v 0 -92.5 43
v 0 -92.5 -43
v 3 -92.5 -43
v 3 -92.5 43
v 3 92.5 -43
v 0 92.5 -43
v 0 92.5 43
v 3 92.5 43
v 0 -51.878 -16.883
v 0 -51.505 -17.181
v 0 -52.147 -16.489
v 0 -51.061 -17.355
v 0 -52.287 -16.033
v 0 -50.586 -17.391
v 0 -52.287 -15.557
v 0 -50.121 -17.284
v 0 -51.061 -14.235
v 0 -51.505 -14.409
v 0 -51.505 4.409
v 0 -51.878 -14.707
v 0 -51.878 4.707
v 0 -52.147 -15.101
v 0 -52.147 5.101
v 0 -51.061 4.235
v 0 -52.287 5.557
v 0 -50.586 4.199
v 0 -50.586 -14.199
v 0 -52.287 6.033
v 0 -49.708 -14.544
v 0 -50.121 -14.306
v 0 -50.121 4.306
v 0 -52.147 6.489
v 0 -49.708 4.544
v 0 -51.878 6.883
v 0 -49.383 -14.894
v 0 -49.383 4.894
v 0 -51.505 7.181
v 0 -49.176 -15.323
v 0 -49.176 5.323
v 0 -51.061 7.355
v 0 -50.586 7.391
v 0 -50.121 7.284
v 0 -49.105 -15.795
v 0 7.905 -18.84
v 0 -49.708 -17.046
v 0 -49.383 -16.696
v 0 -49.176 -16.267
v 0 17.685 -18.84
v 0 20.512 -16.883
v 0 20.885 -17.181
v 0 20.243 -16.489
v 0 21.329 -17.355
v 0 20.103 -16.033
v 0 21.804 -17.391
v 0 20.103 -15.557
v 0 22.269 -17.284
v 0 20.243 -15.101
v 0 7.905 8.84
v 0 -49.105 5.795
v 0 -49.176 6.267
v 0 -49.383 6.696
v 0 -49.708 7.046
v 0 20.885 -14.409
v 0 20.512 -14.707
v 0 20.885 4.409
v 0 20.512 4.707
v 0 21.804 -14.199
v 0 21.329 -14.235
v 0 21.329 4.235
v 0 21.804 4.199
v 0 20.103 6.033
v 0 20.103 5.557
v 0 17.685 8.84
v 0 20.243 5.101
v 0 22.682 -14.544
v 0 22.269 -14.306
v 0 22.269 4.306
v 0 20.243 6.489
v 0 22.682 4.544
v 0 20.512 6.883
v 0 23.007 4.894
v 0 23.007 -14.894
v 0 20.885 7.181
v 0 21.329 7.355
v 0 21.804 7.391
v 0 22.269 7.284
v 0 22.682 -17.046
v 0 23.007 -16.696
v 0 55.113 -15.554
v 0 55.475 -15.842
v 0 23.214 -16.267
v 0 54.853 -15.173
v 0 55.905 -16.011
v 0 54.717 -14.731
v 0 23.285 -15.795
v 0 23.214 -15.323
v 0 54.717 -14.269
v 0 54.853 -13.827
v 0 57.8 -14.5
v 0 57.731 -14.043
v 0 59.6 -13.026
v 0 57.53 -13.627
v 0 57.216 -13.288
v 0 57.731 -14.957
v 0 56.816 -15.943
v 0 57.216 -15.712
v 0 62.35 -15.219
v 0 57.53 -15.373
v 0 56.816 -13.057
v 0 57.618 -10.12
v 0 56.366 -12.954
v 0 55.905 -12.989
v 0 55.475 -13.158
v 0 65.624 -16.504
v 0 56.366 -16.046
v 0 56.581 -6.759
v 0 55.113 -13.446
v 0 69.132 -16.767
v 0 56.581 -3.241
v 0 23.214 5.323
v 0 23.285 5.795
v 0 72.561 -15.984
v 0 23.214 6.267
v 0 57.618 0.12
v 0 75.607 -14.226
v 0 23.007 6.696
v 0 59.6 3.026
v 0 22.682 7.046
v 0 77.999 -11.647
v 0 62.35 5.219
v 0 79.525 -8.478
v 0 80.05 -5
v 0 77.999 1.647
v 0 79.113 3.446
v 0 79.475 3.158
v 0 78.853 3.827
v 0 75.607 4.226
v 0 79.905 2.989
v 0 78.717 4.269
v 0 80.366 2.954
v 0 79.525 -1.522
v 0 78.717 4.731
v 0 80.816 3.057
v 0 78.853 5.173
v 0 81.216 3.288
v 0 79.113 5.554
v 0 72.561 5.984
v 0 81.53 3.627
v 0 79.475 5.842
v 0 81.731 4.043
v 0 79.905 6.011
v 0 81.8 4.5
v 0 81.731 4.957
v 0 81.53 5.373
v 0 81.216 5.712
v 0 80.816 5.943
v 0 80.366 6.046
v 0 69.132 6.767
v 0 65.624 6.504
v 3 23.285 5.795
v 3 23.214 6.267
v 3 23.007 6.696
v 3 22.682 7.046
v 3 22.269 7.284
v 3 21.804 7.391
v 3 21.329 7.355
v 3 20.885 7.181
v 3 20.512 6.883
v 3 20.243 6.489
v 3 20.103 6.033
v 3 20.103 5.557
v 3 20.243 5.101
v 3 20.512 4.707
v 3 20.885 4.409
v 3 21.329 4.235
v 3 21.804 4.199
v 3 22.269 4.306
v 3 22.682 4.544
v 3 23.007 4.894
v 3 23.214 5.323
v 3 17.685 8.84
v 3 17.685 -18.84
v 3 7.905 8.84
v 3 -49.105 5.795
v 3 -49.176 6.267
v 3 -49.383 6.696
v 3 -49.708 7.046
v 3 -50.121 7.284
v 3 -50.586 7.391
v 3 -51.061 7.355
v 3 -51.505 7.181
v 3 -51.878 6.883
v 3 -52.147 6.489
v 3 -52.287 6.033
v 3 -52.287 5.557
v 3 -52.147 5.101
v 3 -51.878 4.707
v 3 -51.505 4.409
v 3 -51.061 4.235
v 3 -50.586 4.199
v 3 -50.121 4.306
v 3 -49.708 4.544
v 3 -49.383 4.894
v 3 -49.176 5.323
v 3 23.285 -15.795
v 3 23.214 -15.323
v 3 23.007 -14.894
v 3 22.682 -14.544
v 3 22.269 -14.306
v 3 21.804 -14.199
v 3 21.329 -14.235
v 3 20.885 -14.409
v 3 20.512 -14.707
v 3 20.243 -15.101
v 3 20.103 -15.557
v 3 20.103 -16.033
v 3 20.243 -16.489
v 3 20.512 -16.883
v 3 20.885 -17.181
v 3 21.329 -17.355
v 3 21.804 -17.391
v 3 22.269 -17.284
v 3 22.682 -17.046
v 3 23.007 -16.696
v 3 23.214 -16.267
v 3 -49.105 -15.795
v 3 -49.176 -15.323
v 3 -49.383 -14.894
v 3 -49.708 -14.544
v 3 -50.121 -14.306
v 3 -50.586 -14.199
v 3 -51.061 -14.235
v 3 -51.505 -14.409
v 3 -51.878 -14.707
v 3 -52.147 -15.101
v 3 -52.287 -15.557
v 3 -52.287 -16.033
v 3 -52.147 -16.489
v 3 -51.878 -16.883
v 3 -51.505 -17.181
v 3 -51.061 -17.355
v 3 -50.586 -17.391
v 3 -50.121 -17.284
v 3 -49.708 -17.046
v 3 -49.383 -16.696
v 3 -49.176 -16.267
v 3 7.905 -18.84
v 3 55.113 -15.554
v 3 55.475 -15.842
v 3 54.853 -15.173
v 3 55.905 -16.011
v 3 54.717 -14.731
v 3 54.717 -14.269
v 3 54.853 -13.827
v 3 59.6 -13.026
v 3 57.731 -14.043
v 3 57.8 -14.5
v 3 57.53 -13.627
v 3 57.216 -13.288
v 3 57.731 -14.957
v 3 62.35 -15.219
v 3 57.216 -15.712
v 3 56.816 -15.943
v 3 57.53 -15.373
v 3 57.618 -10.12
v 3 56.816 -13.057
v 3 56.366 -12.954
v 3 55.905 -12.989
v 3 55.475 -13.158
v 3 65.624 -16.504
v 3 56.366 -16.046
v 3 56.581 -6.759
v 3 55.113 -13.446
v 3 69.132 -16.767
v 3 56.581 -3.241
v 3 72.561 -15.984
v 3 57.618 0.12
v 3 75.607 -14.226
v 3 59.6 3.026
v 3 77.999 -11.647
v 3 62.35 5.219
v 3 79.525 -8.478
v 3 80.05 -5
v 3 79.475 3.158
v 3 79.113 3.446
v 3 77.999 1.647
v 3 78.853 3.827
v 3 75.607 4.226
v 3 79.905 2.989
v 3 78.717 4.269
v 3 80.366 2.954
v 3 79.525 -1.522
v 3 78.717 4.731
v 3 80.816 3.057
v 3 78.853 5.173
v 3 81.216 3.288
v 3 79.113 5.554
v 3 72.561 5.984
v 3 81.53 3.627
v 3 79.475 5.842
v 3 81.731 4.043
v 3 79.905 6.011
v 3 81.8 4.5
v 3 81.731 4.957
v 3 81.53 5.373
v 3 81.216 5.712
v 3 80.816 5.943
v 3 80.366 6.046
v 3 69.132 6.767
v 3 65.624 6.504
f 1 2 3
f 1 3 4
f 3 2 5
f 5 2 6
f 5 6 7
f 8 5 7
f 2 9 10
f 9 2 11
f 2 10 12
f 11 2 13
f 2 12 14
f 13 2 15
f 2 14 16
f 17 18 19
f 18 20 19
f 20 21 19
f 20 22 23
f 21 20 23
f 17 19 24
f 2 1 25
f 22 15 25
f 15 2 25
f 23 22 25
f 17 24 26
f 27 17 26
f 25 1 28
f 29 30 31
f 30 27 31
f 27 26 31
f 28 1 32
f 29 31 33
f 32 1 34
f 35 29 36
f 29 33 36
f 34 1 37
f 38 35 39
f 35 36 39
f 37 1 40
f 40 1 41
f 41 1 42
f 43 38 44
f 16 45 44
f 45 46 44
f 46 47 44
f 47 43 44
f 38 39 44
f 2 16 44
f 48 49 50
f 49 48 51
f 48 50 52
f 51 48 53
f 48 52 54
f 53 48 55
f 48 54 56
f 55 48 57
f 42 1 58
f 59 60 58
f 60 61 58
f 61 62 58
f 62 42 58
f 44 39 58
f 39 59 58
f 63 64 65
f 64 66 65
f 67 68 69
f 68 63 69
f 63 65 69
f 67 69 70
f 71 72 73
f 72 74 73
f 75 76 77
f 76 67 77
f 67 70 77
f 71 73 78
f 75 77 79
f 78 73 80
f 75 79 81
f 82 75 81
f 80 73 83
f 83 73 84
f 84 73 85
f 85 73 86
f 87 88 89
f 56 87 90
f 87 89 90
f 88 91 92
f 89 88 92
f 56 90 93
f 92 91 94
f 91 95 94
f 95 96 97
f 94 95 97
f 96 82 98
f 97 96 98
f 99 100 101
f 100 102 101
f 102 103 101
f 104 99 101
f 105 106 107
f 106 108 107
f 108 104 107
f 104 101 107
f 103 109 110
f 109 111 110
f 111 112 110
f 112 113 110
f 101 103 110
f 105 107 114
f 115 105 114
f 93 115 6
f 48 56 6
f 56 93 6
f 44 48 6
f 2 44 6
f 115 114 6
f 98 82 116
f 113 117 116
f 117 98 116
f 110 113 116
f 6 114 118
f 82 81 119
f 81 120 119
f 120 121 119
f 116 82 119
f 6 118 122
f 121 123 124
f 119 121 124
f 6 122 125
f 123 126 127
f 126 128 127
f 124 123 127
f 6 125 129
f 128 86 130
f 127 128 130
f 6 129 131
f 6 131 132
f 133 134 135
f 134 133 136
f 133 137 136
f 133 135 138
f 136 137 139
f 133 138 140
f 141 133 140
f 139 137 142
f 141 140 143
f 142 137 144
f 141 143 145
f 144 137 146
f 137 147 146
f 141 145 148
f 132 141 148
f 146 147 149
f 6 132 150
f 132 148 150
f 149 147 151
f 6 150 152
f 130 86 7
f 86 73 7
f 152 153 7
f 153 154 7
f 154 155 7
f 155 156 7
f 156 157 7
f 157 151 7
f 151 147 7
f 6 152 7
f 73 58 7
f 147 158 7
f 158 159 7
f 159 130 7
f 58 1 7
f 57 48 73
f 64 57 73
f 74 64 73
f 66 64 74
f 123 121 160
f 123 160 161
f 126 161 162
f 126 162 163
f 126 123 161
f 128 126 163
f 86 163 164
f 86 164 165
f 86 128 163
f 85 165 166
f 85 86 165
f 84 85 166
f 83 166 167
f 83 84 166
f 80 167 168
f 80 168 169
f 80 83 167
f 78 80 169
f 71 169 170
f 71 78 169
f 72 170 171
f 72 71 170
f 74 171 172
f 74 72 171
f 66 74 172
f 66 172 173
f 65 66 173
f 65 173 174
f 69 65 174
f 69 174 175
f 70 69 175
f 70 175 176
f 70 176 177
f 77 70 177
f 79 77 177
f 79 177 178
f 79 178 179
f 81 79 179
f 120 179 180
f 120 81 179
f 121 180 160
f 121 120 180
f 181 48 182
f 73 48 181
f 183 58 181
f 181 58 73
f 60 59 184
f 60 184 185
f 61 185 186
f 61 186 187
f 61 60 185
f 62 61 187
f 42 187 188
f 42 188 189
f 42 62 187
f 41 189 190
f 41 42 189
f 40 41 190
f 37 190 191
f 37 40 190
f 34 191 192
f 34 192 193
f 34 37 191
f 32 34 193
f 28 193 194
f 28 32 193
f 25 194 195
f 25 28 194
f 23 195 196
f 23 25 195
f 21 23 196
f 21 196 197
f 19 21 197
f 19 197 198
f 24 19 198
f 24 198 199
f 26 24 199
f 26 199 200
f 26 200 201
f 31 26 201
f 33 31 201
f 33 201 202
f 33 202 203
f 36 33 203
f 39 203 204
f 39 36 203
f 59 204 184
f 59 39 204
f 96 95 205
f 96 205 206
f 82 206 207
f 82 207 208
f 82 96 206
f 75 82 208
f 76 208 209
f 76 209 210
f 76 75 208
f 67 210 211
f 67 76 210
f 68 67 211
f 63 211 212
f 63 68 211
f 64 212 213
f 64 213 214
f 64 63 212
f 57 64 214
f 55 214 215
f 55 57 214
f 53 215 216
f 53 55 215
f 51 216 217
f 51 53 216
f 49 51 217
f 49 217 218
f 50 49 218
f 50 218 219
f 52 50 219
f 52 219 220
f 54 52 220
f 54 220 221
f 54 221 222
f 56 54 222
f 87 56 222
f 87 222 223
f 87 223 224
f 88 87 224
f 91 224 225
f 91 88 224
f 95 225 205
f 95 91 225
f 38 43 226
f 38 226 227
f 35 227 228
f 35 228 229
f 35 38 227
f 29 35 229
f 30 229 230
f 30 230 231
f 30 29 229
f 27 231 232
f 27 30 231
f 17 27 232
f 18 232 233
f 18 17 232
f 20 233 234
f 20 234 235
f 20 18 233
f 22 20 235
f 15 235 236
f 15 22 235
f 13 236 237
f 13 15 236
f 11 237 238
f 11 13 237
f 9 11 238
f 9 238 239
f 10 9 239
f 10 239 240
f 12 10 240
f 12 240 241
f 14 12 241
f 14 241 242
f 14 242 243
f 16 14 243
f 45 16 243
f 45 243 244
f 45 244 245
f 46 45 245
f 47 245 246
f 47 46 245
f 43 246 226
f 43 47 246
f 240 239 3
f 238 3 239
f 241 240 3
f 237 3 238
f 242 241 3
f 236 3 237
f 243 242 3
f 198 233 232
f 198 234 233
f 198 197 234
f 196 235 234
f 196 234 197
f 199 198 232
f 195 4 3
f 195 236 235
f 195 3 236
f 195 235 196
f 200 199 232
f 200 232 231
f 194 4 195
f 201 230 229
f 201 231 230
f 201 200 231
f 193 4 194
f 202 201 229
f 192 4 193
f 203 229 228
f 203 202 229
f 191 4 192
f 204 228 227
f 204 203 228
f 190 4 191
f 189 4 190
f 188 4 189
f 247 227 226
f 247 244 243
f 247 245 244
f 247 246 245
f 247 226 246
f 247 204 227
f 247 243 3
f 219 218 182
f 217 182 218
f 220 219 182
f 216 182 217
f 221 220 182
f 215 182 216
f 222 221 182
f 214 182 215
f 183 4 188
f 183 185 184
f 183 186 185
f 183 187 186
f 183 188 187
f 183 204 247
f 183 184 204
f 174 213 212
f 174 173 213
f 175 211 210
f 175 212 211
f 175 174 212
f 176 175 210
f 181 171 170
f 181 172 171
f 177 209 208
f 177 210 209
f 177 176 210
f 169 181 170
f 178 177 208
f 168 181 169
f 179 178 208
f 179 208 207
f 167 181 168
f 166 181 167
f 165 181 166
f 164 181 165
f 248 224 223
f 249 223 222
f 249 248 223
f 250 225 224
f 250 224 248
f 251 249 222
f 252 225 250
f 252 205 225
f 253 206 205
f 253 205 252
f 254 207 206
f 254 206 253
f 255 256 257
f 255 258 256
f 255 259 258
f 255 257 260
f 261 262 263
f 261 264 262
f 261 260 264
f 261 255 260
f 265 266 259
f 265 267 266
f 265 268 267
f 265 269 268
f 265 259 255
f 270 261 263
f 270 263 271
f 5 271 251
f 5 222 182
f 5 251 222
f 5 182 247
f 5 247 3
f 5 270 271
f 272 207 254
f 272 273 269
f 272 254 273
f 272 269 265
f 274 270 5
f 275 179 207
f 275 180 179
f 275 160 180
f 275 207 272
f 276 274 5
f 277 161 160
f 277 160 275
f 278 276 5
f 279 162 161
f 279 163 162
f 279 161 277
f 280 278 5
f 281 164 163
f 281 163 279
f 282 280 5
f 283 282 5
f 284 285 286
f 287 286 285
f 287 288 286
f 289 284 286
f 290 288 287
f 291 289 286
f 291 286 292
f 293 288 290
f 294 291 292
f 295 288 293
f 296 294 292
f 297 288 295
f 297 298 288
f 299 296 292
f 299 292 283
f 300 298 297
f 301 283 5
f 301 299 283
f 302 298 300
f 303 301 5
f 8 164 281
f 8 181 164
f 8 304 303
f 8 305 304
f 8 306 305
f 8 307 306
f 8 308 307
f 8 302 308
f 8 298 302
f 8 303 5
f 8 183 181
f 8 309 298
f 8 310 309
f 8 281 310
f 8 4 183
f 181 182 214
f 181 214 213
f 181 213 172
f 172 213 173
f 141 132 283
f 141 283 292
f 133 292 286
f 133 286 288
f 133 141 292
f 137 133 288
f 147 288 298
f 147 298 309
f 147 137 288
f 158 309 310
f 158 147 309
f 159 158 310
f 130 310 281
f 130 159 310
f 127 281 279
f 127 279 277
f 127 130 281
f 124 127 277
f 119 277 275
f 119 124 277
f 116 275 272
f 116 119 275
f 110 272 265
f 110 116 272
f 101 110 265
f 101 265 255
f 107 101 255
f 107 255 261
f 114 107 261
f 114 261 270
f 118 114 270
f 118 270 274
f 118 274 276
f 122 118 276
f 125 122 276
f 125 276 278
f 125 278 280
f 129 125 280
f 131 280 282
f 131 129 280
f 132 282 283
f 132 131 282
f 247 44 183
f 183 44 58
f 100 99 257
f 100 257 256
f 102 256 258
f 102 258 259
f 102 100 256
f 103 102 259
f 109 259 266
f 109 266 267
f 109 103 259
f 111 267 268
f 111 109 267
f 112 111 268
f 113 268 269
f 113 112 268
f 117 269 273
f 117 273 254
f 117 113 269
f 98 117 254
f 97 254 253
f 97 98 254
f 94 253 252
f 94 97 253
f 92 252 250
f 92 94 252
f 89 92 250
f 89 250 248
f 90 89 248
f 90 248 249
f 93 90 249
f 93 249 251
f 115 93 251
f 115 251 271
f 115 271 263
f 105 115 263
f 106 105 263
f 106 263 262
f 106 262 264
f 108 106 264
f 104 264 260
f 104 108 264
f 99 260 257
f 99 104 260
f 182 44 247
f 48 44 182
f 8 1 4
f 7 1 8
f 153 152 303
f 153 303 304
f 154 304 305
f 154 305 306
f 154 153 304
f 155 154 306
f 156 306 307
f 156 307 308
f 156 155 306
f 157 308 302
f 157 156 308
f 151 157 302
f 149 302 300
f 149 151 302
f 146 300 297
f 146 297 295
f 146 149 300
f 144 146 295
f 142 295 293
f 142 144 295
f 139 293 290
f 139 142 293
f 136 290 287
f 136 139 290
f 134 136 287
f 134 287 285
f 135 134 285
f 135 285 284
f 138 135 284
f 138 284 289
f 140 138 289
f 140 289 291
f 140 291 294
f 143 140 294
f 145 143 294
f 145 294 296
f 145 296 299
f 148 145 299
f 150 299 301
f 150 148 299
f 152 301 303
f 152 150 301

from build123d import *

# Parameters (mm, degrees)
SKETCH_W   = 185
SKETCH_H   = 86
SKETCH_R   = 11.8
SKETCH_R_2 = 1.55
SKETCH_R_3 = 1.6
SKETCH_W_2 = 9.78
SKETCH_H_2 = 27.68
PAD_DEPTH  = 3


with BuildPart() as part:
    # Sketch → Pad (new body)
    with BuildSketch(Plane.YZ):
        Rectangle(SKETCH_W, SKETCH_H)
        with Locations((68.2497, -5)):
            Circle(SKETCH_R, mode=Mode.SUBTRACT)
        with Locations((80.2497, 4.5)):
            Circle(SKETCH_R_2, mode=Mode.SUBTRACT)
        with Locations((56.2497, -14.5)):
            Circle(SKETCH_R_2, mode=Mode.SUBTRACT)
        with Locations((21.6847, 5.795)):
            Circle(SKETCH_R_3, mode=Mode.SUBTRACT)
        with Locations((21.6847, -15.795)):
            Circle(SKETCH_R_3, mode=Mode.SUBTRACT)
        with Locations((-50.7053, 5.795)):
            Circle(SKETCH_R_3, mode=Mode.SUBTRACT)
        with Locations((-50.7053, -15.795)):
            Circle(SKETCH_R_3, mode=Mode.SUBTRACT)
        with Locations((12.7947, -5)):
            Rectangle(SKETCH_W_2, SKETCH_H_2, mode=Mode.SUBTRACT)
    extrude(amount=PAD_DEPTH)


solid = part.part
